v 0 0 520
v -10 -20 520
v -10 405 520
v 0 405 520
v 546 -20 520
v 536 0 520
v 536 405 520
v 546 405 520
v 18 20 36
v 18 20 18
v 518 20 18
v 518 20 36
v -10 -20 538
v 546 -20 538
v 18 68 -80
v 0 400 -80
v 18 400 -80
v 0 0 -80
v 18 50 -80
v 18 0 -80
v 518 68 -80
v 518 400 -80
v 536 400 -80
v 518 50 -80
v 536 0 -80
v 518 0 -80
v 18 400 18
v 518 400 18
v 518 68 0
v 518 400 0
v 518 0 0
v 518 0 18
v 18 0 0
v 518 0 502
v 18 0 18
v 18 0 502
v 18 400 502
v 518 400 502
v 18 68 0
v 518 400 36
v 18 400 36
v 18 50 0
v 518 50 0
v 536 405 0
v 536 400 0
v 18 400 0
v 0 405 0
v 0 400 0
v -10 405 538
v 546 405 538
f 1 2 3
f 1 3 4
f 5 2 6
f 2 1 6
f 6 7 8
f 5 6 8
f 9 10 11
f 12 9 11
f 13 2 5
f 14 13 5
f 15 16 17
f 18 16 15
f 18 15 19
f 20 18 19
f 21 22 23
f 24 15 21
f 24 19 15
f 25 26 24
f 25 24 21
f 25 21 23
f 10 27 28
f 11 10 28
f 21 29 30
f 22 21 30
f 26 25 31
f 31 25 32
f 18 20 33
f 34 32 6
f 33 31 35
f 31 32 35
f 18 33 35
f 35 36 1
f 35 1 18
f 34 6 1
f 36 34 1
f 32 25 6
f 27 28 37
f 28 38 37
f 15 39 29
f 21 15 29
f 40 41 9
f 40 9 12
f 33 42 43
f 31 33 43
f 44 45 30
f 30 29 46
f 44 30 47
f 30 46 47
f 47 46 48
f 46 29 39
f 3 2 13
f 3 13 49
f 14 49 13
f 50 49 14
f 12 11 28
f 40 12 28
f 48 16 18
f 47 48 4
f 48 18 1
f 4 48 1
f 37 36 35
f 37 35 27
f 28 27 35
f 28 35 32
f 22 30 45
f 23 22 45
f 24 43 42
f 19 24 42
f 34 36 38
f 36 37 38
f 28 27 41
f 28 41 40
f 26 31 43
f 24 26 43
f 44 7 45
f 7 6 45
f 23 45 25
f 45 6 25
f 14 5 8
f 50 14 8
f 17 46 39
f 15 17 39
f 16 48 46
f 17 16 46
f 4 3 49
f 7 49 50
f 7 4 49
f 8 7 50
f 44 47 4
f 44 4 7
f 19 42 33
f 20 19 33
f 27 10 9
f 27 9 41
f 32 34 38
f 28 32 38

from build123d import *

# Parameters (mm, degrees)
F1_W      = 536
F1_H      = 400
F2_DEPTH  = 18
F3_W      = 18
F3_H      = 400
F5_DEPTH  = 484
F6_W      = 518
F6_H      = 400
F6_W_2    = 18
F7_DEPTH  = 18
F8_W      = 500
F8_H      = 380
F9_DEPTH  = 18
F11_DEPTH = 80
F12_W     = 500
F12_H     = 484
F14_DEPTH = 5
F15_W     = 556
F15_H     = 425
F16_DEPTH = 18


with BuildPart() as f2:
    # F1 (on Top) → F2 (new body)
    with BuildSketch(Plane.XY):
        with Locations((268, 200)):
            Rectangle(F1_W, F1_H)
    extrude(amount=F2_DEPTH)

    # F3 (on face) → F5 (join)
    with BuildSketch(Plane.XY.offset(18)):
        with Locations((9, 200)):
            Rectangle(F3_W, F3_H)
        with Locations((527, 200)):
            Rectangle(F3_W, F3_H)
    extrude(amount=F5_DEPTH)

    # F6 (on face) → F7 (join)
    with BuildSketch(Plane.XY.offset(502)):
        with Locations((277, 200)):
            Rectangle(F6_W, F6_H)
        with Locations((9, 200)):
            Rectangle(F6_W_2, F6_H)
    extrude(amount=F7_DEPTH)

    # F10 (on face) → F11 (join)
    with BuildSketch(Plane(origin=(0, 0, 0), x_dir=(1, 0, 0), z_dir=(0, 0, -1))):
        Polygon((0, 0), (0, -400), (18, -400), (18, -68), (518, -68), (518, -400), (536, -400), (536, 0), (518, 0), (518, -50), (18, -50), (18, 0), align=None)
    extrude(amount=F11_DEPTH)



with BuildPart() as f9:
    # F8 (on face) → F9 (new body)
    with BuildSketch(Plane.XY.offset(18)):
        with Locations((268, 210)):
            Rectangle(F8_W, F8_H)
    extrude(amount=F9_DEPTH)


with BuildPart() as f14:
    # F12 (on face) → F14 (new body)
    with BuildSketch(Plane(origin=(0, 400, 0), x_dir=(-1, 0, 0), z_dir=(0, 1, 0))):
        Polygon((0, 520), (-536, 520), (-536, 0), (-518, 0), (-18, 0), (0, 0), align=None)
        with Locations((-268, 260)):
            Rectangle(F12_W, F12_H, mode=Mode.SUBTRACT)
        with Locations((-268, 260)):
            Rectangle(F12_W, F12_H)
    extrude(amount=F14_DEPTH)


with BuildPart() as f2_1:
    add(f2.part)

    add(f14.part)  # F16 merges F14
    # F15 (on face) → F16 (join)
    with BuildSketch(Plane.XY.offset(520)):
        with Locations((268, 192.5)):
            Rectangle(F15_W, F15_H)
    extrude(amount=F16_DEPTH)


solid = Compound([f9.part, f2_1.part])
